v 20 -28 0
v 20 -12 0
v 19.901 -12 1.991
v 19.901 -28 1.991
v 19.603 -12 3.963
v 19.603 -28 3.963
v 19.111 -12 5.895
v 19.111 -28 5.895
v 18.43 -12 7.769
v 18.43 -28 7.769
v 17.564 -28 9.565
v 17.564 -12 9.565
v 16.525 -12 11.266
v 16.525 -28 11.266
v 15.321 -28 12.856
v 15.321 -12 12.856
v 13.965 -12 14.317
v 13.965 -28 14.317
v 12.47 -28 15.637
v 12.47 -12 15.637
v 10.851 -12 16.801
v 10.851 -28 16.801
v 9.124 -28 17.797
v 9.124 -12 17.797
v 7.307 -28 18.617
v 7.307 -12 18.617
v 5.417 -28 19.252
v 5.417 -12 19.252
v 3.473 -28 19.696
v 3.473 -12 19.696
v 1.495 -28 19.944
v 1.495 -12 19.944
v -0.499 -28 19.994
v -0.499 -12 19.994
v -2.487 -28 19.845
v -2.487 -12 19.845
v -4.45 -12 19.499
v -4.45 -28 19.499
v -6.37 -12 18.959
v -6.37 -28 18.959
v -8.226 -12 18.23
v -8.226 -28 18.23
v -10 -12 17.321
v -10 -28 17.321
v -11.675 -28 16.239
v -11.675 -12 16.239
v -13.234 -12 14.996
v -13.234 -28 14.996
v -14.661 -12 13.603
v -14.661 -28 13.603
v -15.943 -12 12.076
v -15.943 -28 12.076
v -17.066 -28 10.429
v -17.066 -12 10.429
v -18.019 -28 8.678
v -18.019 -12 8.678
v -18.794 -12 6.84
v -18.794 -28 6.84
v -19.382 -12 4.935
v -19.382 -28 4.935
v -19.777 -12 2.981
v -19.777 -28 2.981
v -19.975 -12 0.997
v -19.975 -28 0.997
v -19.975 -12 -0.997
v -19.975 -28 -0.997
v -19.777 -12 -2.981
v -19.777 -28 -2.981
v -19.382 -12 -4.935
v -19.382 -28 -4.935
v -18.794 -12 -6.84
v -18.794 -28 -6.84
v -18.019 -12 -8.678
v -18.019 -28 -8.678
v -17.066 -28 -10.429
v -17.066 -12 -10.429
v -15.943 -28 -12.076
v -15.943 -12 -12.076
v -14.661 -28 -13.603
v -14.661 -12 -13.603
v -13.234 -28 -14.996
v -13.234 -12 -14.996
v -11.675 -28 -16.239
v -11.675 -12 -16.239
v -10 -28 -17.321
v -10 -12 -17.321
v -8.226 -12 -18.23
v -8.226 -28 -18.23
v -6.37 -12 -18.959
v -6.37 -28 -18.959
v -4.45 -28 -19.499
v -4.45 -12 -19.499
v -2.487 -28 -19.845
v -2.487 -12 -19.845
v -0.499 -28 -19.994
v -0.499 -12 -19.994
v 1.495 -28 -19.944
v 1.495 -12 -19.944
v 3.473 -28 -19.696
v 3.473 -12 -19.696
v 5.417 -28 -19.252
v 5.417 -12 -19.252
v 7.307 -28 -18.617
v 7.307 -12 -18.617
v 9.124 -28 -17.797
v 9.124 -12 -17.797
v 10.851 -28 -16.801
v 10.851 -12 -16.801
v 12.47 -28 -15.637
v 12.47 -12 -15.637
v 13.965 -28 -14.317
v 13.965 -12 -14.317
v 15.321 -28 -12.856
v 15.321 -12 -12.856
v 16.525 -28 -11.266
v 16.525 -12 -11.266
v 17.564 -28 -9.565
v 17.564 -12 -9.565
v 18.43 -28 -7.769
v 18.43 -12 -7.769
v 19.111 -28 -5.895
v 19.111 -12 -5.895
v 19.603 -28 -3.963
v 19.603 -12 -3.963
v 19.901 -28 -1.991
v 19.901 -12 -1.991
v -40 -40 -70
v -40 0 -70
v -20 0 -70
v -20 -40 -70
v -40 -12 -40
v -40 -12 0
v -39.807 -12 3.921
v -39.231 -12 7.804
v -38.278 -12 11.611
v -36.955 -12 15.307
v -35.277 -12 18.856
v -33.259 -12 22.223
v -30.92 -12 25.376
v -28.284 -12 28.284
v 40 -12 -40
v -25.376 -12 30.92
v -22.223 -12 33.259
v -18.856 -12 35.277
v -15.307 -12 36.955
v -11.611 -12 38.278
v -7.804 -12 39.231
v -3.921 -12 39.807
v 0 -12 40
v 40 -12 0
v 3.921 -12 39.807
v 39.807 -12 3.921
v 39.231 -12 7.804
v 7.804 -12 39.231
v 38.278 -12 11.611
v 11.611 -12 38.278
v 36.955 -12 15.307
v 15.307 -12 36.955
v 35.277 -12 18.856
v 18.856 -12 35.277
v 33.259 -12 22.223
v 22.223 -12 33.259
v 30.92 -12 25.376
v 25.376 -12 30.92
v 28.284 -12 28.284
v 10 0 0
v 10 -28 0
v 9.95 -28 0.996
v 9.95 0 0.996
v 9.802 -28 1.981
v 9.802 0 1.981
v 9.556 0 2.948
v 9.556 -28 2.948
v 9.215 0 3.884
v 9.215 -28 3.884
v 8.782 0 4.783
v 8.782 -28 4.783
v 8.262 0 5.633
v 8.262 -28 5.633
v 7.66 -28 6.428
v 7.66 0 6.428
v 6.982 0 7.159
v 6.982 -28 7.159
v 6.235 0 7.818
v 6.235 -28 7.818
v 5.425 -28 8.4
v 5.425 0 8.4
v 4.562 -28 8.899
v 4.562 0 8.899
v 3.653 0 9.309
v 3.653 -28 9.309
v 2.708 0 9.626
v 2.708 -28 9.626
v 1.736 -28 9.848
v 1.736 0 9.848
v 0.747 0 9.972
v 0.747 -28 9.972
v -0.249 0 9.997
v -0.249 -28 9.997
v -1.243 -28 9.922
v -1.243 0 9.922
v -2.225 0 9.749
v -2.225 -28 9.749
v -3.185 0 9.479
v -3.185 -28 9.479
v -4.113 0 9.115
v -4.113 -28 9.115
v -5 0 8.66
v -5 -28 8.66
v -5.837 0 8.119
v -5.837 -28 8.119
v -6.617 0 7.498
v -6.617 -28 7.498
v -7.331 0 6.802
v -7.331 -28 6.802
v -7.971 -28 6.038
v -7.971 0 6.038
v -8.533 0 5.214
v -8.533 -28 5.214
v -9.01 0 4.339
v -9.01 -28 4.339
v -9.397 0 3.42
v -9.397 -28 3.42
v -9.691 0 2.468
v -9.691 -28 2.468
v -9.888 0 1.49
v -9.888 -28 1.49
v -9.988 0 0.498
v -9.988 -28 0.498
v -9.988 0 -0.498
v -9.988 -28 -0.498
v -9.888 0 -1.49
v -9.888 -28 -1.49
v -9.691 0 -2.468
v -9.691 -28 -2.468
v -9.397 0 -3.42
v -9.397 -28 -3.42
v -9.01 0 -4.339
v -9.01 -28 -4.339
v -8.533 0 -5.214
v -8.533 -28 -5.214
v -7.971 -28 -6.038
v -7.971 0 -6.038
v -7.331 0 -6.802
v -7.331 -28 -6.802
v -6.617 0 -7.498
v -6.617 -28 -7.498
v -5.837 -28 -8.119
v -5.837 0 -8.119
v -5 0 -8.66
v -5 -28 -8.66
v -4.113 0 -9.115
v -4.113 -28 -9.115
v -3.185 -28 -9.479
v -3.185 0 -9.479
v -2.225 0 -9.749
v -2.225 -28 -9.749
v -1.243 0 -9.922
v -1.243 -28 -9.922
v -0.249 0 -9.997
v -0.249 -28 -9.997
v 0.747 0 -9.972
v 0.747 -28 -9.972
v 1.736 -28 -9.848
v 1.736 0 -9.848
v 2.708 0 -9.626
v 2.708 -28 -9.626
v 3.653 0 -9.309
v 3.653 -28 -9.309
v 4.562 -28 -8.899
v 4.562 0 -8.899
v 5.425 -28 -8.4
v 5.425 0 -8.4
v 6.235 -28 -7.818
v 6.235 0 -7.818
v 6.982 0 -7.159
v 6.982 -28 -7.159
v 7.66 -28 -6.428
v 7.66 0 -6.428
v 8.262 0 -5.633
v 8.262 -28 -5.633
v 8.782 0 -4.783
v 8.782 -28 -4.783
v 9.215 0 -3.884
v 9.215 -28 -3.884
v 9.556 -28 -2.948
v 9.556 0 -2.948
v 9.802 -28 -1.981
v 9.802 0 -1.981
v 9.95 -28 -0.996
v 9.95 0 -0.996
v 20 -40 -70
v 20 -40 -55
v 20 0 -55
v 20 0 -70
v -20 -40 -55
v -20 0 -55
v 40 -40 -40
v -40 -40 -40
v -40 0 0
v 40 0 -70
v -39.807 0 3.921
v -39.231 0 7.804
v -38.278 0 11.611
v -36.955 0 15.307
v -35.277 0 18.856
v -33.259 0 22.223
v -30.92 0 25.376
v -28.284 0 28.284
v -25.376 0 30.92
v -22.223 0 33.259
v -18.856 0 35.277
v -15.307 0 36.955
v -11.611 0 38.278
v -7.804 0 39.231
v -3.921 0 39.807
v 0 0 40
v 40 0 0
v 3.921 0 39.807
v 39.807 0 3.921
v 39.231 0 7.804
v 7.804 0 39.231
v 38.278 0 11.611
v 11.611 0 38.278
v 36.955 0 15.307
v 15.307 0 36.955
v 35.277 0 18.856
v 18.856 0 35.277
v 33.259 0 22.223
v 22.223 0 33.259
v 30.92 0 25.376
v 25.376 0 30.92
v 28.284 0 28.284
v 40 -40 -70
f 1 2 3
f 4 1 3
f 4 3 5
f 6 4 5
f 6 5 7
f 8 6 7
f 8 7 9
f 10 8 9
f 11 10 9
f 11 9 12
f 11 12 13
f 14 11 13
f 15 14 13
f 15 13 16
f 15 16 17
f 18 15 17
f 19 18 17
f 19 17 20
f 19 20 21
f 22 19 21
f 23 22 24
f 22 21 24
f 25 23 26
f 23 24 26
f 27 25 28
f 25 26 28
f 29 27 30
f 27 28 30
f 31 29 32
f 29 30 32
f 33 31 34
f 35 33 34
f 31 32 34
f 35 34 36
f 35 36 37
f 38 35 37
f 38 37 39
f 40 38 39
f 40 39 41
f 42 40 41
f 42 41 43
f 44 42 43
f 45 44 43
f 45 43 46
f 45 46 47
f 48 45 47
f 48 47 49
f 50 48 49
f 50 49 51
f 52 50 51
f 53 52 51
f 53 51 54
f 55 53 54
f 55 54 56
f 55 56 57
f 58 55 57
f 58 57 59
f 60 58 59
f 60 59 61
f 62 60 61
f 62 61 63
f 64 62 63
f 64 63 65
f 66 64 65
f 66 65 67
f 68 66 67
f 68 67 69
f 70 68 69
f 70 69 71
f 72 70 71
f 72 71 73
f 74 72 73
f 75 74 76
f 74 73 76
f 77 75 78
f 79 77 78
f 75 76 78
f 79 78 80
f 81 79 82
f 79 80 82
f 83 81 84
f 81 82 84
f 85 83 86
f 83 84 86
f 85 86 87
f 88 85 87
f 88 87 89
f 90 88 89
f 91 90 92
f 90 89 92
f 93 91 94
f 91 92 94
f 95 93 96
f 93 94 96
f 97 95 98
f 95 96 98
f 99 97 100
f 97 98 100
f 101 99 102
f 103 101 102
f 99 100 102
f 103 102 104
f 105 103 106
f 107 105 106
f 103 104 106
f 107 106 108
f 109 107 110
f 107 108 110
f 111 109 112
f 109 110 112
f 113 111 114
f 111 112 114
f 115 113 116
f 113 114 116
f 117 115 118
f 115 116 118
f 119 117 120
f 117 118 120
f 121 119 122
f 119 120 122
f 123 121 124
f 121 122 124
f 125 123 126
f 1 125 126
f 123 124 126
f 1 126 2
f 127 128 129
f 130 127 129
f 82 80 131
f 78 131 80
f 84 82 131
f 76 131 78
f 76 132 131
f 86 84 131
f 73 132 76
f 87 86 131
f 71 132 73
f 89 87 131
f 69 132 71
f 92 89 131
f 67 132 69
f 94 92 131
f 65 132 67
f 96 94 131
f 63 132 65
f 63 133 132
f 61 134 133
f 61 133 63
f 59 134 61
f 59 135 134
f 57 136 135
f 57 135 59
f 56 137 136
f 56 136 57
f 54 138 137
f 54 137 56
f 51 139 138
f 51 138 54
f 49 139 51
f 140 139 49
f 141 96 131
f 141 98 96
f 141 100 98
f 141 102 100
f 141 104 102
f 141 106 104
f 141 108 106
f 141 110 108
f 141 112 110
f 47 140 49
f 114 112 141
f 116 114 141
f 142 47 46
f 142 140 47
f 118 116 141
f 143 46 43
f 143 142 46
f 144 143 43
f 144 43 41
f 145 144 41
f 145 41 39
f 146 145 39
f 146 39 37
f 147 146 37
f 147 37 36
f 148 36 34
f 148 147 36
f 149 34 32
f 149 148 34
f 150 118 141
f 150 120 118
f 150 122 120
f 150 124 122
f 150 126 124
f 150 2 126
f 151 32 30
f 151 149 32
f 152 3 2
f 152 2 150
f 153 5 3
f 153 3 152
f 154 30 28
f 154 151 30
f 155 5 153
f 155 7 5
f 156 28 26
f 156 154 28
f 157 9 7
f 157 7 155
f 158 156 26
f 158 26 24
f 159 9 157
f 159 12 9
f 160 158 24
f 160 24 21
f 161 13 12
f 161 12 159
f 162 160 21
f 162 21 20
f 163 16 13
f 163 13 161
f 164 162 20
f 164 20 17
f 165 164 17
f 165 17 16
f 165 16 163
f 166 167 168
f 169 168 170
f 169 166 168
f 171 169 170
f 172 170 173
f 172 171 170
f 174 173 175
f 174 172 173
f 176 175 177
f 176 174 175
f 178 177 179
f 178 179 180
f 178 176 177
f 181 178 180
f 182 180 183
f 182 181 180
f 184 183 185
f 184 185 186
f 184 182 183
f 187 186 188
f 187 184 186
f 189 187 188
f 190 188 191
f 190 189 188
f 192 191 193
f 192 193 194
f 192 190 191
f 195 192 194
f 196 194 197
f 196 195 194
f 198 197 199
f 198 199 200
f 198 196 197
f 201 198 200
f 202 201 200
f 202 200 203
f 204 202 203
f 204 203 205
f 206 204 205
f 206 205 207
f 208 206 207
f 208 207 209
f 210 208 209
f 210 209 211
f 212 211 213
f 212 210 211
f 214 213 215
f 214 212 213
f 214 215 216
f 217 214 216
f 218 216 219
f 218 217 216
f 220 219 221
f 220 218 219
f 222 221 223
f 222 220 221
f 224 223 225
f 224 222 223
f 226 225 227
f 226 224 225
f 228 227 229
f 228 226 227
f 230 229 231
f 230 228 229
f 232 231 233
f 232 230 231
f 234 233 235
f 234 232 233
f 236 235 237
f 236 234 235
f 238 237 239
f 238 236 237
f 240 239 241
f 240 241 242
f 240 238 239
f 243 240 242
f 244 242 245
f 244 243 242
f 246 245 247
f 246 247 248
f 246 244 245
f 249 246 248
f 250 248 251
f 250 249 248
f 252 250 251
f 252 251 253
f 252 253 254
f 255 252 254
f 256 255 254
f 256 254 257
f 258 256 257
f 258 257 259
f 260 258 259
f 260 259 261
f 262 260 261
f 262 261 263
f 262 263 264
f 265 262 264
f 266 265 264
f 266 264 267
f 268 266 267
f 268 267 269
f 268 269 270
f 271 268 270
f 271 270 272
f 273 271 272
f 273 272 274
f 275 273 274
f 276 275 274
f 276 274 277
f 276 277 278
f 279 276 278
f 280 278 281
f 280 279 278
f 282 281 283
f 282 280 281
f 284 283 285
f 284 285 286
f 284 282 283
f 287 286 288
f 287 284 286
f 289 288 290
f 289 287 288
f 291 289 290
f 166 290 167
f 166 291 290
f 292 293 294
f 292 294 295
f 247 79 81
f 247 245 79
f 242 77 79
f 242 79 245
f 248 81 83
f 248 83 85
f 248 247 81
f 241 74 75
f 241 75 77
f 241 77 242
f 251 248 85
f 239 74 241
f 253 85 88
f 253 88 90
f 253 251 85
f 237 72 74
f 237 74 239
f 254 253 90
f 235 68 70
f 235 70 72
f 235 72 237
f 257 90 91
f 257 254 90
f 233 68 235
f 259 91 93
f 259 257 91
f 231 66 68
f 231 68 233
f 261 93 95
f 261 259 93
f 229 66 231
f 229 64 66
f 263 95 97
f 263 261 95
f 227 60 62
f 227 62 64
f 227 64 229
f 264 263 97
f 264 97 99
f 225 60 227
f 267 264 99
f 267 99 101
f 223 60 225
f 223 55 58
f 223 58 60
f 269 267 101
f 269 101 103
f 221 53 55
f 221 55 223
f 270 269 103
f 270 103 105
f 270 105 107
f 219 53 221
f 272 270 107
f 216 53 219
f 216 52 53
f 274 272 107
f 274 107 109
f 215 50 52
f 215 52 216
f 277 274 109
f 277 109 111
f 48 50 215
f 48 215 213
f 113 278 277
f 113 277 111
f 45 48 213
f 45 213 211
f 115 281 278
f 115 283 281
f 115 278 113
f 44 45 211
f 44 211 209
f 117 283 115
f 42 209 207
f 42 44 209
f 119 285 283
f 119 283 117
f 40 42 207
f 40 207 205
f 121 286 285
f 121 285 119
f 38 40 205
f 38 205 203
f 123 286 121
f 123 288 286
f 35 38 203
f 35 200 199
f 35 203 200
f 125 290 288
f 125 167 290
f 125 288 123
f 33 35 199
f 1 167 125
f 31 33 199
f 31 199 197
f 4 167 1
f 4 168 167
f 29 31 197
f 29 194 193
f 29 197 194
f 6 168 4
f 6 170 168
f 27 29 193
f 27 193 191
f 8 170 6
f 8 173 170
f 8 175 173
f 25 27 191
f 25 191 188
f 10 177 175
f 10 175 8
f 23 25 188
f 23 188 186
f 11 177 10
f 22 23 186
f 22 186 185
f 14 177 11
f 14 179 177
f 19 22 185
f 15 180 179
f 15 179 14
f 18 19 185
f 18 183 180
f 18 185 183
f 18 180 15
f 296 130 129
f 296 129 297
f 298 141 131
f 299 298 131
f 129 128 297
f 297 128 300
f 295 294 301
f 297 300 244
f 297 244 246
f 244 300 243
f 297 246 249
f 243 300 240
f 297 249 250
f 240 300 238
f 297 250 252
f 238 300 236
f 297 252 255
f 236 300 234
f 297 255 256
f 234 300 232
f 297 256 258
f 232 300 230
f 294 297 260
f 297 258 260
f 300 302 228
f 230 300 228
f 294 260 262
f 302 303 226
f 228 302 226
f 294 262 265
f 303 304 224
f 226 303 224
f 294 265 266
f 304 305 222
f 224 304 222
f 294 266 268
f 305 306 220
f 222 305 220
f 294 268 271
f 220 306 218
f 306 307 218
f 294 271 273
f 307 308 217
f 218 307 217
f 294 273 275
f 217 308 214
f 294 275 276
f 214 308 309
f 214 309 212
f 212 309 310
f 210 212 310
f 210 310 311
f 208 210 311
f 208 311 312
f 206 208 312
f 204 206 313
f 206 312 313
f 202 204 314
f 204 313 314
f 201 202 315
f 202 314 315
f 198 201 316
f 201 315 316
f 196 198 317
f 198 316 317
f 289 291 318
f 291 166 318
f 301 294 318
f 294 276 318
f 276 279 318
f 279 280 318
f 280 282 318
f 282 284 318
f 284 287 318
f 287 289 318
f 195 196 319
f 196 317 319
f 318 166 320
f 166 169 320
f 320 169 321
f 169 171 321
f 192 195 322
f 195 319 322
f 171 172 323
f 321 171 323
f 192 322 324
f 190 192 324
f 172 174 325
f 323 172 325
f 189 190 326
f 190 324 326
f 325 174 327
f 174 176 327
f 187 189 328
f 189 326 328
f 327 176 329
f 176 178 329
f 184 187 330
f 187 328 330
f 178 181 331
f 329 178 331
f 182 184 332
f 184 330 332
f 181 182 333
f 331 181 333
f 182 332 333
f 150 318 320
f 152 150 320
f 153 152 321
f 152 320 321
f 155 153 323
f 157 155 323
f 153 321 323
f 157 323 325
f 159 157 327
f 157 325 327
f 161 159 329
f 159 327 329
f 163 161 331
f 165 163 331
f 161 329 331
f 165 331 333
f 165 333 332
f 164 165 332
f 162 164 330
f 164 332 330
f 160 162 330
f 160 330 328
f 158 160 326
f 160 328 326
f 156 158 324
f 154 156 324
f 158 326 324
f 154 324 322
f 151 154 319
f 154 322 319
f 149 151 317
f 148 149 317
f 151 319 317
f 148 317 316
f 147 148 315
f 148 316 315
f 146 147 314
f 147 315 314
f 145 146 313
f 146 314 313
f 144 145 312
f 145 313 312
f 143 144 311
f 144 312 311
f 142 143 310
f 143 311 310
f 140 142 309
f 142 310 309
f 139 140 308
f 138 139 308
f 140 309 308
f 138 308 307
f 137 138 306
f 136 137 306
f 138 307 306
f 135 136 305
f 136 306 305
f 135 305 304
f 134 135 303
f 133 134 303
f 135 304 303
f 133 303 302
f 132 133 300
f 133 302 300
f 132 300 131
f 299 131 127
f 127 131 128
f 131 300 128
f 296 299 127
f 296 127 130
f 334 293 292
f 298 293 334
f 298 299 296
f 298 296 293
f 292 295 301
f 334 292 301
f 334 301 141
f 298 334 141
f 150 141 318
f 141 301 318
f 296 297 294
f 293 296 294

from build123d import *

# Parameters (mm, degrees)
F0_R     = 20
F0_R_2   = 10
F1_DEPTH = 28
F2_DEPTH = 40
F3_DEPTH = 12


with BuildPart() as f1:
    # F0 (on Front) → F1 (new body)
    with BuildSketch(Plane.XZ):
        Circle(F0_R)
        Circle(F0_R_2, mode=Mode.SUBTRACT)
    extrude(amount=F1_DEPTH)



with BuildPart() as f2:
    # F0 (on Front) → F2 (new body)
    with BuildSketch(Plane.XZ):
        Polygon((40, -40), (0, -40), (-40, -40), (-40, -70), (-20, -70), (-20, -55), (20, -55), (20, -70), (40, -70), align=None)
    extrude(amount=F2_DEPTH)


with BuildPart() as f1_1:
    add(f1.part)

    add(f2.part)  # F3 merges F2
    # F0 (on Front) → F3 (join)
    with BuildSketch(Plane.XZ):
        with BuildLine():
            ThreePointArc((0, -40), (28.2842712475, -28.2842712475), (40, 0))
            ThreePointArc((40, 0), (0, 40), (-40, 0))
            ThreePointArc((-40, 0), (-28.2842712475, -28.2842712475), (0, -40))
        make_face()
        Circle(F0_R, mode=Mode.SUBTRACT)
        with BuildLine():
            ThreePointArc((0, -40), (-28.2842712475, -28.2842712475), (-40, 0))
            Line((-40, 0), (-40, -40))
            Line((-40, -40), (0, -40))
        make_face()
        with BuildLine():
            Line((40, -40), (40, 0))
            ThreePointArc((40, 0), (28.2842712475, -28.2842712475), (0, -40))
            Line((0, -40), (40, -40))
        make_face()
    extrude(amount=F3_DEPTH)


solid = f1_1.part
